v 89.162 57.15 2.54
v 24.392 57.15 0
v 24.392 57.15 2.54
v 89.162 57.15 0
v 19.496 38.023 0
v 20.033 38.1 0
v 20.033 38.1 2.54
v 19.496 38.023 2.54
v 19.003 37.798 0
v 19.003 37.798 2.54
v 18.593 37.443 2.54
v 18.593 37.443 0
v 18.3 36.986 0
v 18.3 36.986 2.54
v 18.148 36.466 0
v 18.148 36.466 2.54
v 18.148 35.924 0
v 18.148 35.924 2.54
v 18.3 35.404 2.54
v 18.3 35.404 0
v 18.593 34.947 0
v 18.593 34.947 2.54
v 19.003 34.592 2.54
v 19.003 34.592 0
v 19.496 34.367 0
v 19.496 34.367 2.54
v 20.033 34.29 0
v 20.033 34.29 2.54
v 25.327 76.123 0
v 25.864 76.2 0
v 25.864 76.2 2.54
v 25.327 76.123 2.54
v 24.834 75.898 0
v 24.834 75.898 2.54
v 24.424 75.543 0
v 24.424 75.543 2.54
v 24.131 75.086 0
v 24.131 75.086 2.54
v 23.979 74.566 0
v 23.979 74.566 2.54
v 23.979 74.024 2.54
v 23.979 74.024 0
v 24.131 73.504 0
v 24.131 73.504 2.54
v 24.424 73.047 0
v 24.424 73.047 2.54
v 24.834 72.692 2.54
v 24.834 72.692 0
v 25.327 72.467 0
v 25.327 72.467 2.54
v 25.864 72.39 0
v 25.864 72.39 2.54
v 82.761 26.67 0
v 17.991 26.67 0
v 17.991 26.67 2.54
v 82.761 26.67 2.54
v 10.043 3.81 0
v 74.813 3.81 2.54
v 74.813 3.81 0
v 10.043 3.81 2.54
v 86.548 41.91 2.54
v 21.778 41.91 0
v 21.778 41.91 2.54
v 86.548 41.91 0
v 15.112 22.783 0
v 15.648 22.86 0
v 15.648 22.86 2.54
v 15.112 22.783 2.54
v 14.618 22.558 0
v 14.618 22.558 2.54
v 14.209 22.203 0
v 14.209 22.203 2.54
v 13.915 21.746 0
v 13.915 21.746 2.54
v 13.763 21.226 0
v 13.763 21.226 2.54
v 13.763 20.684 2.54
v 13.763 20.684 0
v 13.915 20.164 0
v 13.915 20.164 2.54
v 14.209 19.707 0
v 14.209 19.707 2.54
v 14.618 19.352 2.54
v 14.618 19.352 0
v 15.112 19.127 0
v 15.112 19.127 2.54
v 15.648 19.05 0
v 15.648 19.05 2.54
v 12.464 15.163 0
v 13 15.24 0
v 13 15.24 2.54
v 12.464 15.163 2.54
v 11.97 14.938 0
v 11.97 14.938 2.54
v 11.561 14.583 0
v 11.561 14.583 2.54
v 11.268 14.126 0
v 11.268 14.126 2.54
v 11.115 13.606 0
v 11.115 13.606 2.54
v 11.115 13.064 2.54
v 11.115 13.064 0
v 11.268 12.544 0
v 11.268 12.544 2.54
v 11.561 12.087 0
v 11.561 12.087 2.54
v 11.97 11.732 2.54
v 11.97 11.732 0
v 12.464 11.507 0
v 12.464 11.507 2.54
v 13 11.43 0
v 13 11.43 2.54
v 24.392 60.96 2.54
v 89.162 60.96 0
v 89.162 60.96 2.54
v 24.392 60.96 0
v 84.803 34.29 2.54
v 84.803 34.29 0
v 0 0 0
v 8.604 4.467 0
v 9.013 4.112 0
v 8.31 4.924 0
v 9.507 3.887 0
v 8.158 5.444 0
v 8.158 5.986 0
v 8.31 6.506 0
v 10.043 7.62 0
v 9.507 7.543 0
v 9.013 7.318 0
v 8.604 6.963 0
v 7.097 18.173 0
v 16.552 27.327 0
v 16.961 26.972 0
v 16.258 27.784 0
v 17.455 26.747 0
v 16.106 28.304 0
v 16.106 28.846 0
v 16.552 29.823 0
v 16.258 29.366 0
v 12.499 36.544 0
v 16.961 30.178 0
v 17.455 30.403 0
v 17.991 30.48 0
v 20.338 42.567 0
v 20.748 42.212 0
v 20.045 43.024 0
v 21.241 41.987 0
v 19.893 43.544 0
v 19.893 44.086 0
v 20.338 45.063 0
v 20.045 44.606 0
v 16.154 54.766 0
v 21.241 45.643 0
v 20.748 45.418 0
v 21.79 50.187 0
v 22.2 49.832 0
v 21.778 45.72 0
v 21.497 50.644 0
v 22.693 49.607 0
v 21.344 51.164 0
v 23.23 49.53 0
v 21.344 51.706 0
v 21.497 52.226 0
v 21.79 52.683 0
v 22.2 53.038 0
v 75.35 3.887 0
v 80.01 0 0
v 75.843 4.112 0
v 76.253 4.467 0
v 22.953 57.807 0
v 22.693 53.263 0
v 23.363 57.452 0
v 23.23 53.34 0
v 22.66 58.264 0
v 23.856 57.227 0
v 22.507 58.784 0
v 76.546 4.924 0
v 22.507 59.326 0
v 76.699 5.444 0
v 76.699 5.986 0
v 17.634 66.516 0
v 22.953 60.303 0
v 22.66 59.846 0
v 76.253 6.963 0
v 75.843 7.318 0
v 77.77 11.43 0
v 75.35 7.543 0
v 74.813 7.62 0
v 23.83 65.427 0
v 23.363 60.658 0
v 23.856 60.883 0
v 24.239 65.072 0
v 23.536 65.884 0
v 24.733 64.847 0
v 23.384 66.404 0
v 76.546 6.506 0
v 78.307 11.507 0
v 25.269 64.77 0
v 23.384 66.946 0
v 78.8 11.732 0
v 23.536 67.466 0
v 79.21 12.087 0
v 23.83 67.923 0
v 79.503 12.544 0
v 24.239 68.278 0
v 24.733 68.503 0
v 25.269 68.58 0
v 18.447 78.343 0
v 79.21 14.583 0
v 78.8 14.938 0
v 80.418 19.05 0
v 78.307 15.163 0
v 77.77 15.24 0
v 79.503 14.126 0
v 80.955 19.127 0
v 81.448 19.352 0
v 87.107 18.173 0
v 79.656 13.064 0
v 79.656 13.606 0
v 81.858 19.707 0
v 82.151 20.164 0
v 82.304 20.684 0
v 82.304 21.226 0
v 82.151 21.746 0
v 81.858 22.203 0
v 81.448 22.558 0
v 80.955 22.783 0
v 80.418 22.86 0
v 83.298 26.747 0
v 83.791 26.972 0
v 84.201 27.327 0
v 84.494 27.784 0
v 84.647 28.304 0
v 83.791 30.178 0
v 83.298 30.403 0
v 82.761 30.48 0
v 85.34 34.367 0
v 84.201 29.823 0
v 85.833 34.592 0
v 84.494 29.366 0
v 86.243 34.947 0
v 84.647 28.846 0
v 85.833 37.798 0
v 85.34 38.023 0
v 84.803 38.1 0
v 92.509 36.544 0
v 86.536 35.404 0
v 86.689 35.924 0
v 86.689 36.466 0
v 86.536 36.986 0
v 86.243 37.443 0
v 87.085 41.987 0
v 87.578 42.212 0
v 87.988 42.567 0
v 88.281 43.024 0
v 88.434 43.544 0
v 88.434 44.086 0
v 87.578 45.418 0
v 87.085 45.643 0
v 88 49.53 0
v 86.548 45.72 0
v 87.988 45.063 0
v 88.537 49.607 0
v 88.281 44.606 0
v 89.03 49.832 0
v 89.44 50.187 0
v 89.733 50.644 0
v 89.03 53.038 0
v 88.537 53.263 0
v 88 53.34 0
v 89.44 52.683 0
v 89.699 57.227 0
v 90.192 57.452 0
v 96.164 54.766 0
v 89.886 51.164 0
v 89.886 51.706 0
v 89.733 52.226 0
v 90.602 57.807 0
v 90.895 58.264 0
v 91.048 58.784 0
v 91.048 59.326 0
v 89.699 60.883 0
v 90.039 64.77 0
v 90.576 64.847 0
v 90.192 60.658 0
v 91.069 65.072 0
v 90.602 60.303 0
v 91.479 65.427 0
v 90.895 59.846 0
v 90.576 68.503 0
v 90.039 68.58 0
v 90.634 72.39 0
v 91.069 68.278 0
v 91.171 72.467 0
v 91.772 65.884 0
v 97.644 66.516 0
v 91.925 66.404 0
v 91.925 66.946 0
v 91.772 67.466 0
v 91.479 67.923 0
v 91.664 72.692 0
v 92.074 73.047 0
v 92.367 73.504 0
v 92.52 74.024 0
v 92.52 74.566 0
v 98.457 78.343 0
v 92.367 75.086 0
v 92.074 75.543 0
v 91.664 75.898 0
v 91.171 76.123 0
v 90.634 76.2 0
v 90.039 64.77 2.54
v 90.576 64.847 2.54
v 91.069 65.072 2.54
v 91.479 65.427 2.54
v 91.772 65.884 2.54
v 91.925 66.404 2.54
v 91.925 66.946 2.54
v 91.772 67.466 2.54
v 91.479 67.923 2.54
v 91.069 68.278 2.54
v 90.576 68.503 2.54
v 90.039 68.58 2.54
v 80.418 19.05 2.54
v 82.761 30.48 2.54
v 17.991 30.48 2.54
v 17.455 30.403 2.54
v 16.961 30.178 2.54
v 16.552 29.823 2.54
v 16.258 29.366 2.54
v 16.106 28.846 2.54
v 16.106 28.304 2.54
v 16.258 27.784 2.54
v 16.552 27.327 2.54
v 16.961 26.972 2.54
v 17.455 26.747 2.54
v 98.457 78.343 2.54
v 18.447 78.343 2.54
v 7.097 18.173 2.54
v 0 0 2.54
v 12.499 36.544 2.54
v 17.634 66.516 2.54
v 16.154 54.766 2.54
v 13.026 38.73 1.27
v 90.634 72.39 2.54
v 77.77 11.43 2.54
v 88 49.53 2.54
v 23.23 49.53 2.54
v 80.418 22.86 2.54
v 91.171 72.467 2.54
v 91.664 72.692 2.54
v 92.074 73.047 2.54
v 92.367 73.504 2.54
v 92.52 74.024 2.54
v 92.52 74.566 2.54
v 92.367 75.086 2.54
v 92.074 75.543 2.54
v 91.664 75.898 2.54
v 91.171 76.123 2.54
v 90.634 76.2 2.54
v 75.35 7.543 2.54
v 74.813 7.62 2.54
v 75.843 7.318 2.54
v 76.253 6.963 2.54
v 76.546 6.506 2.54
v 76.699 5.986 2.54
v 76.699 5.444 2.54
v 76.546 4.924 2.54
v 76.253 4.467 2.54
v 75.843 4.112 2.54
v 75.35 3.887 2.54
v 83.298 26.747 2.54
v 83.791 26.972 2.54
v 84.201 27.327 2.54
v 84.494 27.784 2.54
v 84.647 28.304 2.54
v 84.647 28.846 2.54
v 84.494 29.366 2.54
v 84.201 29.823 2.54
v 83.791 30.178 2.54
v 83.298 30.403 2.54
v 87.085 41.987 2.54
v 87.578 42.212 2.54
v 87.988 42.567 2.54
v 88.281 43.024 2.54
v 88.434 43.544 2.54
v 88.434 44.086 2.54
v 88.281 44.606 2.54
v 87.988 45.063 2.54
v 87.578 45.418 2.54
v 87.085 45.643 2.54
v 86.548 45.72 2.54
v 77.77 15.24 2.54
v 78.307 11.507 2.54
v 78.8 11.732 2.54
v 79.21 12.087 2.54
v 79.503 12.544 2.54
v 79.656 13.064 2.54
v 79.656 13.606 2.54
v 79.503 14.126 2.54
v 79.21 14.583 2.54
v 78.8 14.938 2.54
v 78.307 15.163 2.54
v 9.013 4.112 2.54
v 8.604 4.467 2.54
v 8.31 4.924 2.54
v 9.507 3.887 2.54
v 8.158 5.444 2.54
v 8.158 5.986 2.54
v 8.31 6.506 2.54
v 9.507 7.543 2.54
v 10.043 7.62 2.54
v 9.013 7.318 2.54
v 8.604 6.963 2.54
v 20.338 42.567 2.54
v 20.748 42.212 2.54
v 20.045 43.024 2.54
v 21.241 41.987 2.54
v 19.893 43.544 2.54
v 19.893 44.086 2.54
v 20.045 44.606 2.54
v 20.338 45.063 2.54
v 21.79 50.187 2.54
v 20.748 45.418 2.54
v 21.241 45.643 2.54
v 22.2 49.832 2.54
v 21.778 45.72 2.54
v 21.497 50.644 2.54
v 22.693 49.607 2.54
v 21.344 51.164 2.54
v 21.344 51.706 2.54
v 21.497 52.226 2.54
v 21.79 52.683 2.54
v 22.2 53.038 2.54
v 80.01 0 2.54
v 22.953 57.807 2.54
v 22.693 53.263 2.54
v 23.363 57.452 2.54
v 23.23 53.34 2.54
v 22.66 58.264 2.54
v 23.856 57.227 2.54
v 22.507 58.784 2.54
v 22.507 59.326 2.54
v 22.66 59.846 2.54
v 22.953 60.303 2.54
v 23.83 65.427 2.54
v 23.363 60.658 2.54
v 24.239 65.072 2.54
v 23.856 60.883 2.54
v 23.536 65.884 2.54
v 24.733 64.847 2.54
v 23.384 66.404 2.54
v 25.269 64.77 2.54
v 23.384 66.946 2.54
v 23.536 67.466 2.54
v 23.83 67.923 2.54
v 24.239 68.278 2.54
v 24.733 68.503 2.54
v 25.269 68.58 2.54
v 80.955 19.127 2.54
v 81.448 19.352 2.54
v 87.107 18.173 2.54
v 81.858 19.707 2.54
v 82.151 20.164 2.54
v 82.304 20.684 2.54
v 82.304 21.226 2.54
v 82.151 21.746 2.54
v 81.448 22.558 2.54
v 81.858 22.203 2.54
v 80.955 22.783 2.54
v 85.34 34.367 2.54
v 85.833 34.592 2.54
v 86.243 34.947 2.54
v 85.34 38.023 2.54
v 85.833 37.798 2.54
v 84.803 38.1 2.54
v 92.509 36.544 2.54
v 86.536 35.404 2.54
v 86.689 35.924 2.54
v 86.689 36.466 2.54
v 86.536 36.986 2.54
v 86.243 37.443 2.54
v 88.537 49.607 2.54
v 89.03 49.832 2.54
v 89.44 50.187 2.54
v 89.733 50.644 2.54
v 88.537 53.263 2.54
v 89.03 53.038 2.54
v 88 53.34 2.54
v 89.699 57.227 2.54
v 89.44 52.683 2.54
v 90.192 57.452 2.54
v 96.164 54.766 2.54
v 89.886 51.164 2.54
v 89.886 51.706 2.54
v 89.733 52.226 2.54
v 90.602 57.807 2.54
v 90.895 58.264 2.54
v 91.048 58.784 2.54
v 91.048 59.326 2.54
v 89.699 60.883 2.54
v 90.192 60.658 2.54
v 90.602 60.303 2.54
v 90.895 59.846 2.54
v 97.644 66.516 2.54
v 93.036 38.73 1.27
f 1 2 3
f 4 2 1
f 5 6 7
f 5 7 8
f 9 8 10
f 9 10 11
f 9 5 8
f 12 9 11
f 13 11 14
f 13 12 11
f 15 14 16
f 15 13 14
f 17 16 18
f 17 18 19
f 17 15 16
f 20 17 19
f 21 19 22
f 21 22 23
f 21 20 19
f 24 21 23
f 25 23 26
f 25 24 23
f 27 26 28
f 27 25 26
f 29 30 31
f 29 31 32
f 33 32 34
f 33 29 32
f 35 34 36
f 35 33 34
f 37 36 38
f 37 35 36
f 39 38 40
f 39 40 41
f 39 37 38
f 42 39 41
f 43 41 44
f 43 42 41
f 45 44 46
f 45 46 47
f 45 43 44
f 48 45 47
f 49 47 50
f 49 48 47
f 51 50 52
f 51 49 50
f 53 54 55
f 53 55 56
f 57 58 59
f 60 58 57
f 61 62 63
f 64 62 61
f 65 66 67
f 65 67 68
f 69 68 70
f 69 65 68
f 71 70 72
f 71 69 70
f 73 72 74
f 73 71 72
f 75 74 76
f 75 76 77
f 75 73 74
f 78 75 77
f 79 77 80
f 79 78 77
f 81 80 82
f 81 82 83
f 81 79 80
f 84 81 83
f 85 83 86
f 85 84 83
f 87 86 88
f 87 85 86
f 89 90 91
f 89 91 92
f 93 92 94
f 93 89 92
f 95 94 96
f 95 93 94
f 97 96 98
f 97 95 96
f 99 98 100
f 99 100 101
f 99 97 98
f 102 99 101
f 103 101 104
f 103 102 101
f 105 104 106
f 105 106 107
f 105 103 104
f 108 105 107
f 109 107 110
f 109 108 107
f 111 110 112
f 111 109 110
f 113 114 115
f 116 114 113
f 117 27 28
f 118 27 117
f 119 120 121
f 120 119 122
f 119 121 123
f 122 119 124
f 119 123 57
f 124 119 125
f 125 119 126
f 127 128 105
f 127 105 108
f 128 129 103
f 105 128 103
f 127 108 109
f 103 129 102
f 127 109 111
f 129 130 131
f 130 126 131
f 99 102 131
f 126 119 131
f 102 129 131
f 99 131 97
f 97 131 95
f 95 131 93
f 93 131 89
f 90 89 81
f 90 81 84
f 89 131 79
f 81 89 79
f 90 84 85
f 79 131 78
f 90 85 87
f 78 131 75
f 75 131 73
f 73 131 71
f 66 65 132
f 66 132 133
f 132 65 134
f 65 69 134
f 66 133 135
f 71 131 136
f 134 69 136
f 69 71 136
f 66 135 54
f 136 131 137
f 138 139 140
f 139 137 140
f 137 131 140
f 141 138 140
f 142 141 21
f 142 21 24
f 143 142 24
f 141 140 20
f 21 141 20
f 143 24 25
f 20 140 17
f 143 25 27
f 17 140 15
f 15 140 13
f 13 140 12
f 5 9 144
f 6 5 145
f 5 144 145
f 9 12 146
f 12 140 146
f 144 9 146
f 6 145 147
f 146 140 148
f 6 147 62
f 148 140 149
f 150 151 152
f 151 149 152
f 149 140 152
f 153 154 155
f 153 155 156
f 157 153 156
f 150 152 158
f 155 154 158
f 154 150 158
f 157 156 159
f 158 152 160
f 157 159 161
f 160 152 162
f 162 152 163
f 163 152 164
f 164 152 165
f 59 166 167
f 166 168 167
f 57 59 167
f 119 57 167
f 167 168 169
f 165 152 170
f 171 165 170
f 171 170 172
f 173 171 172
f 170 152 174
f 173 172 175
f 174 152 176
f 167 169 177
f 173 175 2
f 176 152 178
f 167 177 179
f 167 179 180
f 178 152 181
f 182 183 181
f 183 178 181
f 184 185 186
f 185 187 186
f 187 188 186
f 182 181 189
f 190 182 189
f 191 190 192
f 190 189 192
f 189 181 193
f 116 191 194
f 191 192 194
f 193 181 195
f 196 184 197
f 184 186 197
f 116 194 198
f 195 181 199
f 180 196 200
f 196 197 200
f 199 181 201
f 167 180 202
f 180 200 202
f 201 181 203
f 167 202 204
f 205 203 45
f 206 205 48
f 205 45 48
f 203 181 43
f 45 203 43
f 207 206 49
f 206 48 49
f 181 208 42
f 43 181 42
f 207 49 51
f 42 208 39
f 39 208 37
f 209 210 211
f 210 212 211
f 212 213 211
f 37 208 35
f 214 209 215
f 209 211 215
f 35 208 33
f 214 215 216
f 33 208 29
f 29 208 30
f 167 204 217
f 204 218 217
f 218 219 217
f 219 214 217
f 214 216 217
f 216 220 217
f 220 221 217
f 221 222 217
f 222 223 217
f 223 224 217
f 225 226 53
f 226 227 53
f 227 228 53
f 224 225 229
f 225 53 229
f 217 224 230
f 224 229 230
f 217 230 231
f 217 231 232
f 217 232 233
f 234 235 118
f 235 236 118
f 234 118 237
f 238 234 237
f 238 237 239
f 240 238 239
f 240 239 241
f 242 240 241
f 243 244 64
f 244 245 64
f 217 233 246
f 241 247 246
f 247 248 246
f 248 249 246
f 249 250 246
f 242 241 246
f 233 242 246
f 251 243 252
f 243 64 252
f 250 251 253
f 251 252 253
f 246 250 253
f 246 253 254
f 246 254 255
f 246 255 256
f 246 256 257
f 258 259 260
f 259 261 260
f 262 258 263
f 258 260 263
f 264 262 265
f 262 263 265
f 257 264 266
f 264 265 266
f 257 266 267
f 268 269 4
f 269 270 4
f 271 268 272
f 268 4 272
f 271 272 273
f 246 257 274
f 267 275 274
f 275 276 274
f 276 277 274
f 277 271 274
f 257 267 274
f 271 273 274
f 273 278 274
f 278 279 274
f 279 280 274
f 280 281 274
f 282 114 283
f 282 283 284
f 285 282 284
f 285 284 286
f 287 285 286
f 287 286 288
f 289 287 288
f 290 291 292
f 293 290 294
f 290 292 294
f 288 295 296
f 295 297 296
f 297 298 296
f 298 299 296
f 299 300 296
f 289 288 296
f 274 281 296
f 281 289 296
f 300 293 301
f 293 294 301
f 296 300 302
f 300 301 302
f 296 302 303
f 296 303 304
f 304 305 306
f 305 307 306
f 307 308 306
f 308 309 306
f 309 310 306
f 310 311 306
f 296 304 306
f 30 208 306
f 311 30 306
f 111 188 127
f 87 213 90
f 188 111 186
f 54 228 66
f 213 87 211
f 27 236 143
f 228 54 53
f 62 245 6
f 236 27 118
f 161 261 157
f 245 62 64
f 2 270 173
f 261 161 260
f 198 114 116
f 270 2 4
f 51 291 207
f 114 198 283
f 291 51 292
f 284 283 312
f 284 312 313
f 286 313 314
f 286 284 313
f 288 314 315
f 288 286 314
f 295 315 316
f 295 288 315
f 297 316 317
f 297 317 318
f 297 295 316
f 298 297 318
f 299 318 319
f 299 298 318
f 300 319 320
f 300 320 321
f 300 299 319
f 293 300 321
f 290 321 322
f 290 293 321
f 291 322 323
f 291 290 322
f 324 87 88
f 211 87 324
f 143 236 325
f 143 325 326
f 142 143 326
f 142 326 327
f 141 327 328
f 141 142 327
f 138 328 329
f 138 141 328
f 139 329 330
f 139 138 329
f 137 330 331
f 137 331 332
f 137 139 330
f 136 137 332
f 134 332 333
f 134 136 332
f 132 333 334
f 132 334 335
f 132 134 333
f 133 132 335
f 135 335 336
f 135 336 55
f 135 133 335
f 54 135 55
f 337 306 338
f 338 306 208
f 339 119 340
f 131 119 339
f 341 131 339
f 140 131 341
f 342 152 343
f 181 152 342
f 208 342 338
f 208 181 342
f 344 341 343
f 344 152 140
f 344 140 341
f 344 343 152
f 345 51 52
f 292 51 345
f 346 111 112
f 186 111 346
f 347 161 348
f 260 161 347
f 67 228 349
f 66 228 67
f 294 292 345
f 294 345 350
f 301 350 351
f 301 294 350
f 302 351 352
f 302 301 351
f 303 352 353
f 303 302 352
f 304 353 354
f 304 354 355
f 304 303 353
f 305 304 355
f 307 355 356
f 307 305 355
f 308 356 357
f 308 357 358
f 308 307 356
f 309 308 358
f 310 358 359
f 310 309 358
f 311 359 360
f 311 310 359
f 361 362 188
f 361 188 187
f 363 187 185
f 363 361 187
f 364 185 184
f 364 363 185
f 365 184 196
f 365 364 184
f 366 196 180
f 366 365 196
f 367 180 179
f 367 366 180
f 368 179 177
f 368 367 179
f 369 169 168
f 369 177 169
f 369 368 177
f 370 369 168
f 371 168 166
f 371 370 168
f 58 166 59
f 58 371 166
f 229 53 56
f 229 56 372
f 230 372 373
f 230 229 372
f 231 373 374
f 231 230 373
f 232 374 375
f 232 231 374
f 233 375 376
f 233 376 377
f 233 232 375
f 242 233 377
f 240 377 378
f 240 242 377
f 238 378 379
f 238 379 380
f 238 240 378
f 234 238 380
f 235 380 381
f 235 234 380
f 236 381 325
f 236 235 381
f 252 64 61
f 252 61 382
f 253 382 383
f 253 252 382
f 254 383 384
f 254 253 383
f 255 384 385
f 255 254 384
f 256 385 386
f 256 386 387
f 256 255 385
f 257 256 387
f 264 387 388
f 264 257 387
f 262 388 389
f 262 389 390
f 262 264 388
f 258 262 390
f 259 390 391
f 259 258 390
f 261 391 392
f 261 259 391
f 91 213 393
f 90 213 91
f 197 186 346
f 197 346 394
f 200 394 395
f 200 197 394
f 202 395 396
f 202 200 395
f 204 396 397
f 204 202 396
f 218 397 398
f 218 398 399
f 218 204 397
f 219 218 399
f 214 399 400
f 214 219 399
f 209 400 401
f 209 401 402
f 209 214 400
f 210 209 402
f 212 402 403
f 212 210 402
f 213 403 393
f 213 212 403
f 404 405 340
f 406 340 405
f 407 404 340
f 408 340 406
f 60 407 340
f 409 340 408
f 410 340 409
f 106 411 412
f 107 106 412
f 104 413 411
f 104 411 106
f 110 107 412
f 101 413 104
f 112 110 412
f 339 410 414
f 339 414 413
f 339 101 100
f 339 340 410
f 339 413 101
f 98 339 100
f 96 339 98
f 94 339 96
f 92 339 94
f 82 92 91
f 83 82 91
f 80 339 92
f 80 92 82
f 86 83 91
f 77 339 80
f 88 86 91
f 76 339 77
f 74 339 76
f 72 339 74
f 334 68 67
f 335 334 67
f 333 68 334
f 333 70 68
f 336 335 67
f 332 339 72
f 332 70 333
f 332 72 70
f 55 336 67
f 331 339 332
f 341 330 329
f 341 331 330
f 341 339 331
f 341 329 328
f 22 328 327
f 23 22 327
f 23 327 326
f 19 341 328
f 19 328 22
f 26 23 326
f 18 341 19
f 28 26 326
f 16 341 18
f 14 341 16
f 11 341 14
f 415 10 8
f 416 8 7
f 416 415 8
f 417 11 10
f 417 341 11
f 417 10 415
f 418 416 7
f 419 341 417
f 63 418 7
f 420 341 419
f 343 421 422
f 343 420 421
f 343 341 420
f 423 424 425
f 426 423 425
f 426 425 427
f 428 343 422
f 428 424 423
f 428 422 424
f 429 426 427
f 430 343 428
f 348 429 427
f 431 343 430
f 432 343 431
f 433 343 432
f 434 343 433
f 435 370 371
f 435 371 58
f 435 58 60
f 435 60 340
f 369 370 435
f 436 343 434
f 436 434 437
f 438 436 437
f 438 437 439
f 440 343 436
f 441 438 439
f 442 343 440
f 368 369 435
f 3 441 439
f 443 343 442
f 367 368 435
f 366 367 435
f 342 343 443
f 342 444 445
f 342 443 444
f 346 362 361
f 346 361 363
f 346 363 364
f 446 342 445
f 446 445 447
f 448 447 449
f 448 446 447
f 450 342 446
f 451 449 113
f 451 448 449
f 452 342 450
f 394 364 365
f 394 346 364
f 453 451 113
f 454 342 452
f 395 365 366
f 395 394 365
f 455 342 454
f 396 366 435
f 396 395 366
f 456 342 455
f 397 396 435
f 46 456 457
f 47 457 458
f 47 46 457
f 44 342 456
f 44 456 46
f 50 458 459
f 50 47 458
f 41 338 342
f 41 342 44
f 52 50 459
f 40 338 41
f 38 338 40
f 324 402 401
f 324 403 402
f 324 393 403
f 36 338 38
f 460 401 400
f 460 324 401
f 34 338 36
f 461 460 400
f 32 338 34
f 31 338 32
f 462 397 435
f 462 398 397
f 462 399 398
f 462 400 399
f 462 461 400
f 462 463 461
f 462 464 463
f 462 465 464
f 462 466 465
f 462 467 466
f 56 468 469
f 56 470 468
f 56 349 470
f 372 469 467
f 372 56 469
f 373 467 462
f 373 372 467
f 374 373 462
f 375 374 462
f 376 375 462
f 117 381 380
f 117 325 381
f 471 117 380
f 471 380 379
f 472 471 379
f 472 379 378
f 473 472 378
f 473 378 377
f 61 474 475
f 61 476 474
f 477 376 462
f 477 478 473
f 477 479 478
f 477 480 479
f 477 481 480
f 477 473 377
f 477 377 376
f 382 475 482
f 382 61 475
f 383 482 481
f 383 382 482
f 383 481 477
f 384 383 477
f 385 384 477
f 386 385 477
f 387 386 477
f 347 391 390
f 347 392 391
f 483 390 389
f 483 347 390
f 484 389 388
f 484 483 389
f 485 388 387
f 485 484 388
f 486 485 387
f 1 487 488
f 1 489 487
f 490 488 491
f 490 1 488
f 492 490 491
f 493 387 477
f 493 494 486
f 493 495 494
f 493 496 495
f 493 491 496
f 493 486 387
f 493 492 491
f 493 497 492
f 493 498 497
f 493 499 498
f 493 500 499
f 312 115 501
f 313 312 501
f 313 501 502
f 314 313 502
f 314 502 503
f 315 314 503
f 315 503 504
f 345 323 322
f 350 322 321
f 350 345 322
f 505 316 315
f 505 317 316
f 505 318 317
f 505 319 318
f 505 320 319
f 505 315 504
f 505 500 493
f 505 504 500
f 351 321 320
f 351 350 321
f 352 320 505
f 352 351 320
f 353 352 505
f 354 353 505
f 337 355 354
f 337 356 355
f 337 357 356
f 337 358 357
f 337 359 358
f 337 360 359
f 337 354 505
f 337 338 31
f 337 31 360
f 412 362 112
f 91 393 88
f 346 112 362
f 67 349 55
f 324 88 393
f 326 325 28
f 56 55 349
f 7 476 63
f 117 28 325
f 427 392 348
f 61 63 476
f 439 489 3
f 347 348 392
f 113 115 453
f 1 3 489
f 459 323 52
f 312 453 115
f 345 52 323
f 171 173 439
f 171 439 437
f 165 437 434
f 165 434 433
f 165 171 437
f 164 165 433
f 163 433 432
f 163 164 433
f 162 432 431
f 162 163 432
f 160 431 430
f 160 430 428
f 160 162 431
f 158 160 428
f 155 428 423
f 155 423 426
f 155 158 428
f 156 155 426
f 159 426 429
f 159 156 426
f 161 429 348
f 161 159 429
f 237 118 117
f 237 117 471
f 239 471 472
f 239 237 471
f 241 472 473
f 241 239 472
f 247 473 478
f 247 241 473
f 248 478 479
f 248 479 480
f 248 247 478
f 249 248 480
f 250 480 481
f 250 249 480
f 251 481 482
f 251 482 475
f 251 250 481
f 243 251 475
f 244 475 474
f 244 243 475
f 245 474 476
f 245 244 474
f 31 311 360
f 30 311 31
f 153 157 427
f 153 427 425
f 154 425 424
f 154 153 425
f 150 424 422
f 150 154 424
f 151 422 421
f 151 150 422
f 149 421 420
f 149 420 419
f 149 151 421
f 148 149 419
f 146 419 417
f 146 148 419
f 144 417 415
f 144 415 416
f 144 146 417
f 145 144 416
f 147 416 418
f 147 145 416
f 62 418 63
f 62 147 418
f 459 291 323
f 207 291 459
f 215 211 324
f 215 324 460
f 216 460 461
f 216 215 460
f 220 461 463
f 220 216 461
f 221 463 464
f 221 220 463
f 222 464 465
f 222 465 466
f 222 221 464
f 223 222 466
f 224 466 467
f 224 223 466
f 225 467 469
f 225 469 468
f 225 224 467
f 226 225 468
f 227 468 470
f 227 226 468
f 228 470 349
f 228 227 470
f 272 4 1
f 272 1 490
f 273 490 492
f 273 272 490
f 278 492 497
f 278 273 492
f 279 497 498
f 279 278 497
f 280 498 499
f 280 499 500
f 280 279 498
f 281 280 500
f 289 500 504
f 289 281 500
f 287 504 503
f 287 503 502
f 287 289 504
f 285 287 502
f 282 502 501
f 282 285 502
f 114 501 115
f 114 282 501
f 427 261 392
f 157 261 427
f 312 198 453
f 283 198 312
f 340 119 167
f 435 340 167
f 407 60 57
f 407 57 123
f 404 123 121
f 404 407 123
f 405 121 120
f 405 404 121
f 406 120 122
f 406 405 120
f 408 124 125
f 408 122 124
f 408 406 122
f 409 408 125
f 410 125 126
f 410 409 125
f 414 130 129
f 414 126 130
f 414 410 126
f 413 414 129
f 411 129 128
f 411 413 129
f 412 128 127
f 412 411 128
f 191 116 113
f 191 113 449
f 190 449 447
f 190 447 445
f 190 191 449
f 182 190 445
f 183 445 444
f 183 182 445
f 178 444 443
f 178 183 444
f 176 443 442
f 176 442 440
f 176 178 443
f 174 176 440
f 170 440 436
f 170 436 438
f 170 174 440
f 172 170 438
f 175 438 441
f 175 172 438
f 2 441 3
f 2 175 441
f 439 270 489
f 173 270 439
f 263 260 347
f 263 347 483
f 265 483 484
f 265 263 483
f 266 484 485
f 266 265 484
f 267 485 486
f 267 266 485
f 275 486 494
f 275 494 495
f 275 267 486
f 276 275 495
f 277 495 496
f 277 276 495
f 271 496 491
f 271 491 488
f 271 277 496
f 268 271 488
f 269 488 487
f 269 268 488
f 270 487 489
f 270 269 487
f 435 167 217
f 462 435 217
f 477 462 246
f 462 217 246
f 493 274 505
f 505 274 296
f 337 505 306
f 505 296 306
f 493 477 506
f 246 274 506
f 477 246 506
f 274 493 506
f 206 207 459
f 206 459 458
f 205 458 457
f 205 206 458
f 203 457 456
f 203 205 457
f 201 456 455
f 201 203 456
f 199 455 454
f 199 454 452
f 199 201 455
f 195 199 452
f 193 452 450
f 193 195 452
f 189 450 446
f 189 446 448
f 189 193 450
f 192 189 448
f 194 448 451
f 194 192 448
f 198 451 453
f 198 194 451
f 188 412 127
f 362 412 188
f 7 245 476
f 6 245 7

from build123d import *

# Parameters (mm, degrees)
BOSS_EXTRUDE1_DEPTH = 2.54
CUT_EXTRUDE1_DEPTH  = 126.848428748
LPATTERN1_DEPTH     = 2.54


# Read off the part's stored shape, not the designer's step: LPattern1
with BuildPart() as part:
    # Sketch1 → Boss-Extrude1 (new body)
    with BuildSketch(Plane.XY):
        with BuildLine():
            Line((0, 0), (80.01, 0))
            add(Edge.make_bspline(
                [(80.01, 0), (96.839490245, 38.288168981), (98.456742521, 78.343125)],
                knots=[0, 0, 0, 0.824657213, 0.824657213, 0.824657213], degree=2))
            Line((98.456742521, 78.343125), (18.446742521, 78.343125))
            add(Edge.make_bspline(
                [(0, 0), (16.829490245, 38.288168981), (18.446742521, 78.343125)],
                knots=[0, 0, 0, 0.824657213, 0.824657213, 0.824657213], degree=2))
        make_face()
    extrude(amount=BOSS_EXTRUDE1_DEPTH)

    # Sketch2 → Cut-Extrude1 (cut, through all)
    with BuildSketch(Plane.XY.offset(2.54)):
        with BuildLine():
            Line((10.043267201, 7.62), (74.813267201, 7.62))
            ThreePointArc((74.813267201, 7.62), (76.718267201, 5.715), (74.813267201, 3.81))
            Line((74.813267201, 3.81), (10.043267201, 3.81))
            ThreePointArc((10.043267201, 3.81), (8.138267201, 5.715), (10.043267201, 7.62))
        make_face()
    extrude(amount=-CUT_EXTRUDE1_DEPTH, mode=Mode.SUBTRACT)

    # LPattern1 outline → LPattern1 (cut)
    with BuildSketch(Plane.XY):
        with BuildLine():
            Line((77.770374016, 15.24), (13.000374016, 15.24))
            ThreePointArc((13.000374016, 15.24), (11.095374016, 13.335), (13.000374016, 11.43))
            Line((13.000374016, 11.43), (77.770374016, 11.43))
            ThreePointArc((77.770374016, 11.43), (79.675374016, 13.335), (77.770374016, 15.24))
        make_face()
        with BuildLine():
            Line((80.418314493, 22.86), (15.648314493, 22.86))
            ThreePointArc((15.648314493, 22.86), (13.743314493, 20.955), (15.648314493, 19.05))
            Line((15.648314493, 19.05), (80.418314493, 19.05))
            ThreePointArc((80.418314493, 19.05), (82.323314493, 20.955), (80.418314493, 22.86))
        make_face()
        with BuildLine():
            Line((82.761233407, 30.48), (17.991233408, 30.48))
            ThreePointArc((17.991233408, 30.48), (16.086233408, 28.575), (17.991233408, 26.67))
            Line((17.991233408, 26.67), (82.761233407, 26.67))
            ThreePointArc((82.761233407, 26.67), (84.666233407, 28.575), (82.761233407, 30.48))
        make_face()
        with BuildLine():
            Line((84.803183747, 38.1), (20.033183747, 38.1))
            ThreePointArc((20.033183747, 38.1), (18.128183747, 36.195), (20.033183747, 34.29))
            Line((20.033183747, 34.29), (84.803183747, 34.29))
            ThreePointArc((84.803183747, 34.29), (86.708183747, 36.195), (84.803183747, 38.1))
        make_face()
        with BuildLine():
            Line((86.548129526, 45.72), (21.778129526, 45.72))
            ThreePointArc((21.778129526, 45.72), (19.873129526, 43.815), (21.778129526, 41.91))
            Line((21.778129526, 41.91), (86.548129526, 41.91))
            ThreePointArc((86.548129526, 41.91), (88.453129526, 43.815), (86.548129526, 45.72))
        make_face()
        with BuildLine():
            Line((87.999948503, 53.34), (23.229948503, 53.34))
            ThreePointArc((23.229948503, 53.34), (21.324948503, 51.435), (23.229948503, 49.53))
            Line((23.229948503, 49.53), (87.999948503, 49.53))
            ThreePointArc((87.999948503, 49.53), (89.904948503, 51.435), (87.999948503, 53.34))
        make_face()
        with BuildLine():
            Line((89.16243478, 60.96), (24.39243478, 60.96))
            ThreePointArc((24.39243478, 60.96), (22.48743478, 59.055), (24.39243478, 57.15))
            Line((24.39243478, 57.15), (89.16243478, 57.15))
            ThreePointArc((89.16243478, 57.15), (91.06743478, 59.055), (89.16243478, 60.96))
        make_face()
        with BuildLine():
            Line((90.039301311, 68.58), (25.269301311, 68.58))
            ThreePointArc((25.269301311, 68.58), (23.364301311, 66.675), (25.269301311, 64.77))
            Line((25.269301311, 64.77), (90.039301311, 64.77))
            ThreePointArc((90.039301311, 64.77), (91.944301311, 66.675), (90.039301311, 68.58))
        make_face()
        with BuildLine():
            Line((90.634182309, 76.2), (25.864182309, 76.2))
            ThreePointArc((25.864182309, 76.2), (23.959182309, 74.295), (25.864182309, 72.39))
            Line((25.864182309, 72.39), (90.634182309, 72.39))
            ThreePointArc((90.634182309, 72.39), (92.539182309, 74.295), (90.634182309, 76.2))
        make_face()
    extrude(amount=LPATTERN1_DEPTH, mode=Mode.SUBTRACT)


solid = part.part
